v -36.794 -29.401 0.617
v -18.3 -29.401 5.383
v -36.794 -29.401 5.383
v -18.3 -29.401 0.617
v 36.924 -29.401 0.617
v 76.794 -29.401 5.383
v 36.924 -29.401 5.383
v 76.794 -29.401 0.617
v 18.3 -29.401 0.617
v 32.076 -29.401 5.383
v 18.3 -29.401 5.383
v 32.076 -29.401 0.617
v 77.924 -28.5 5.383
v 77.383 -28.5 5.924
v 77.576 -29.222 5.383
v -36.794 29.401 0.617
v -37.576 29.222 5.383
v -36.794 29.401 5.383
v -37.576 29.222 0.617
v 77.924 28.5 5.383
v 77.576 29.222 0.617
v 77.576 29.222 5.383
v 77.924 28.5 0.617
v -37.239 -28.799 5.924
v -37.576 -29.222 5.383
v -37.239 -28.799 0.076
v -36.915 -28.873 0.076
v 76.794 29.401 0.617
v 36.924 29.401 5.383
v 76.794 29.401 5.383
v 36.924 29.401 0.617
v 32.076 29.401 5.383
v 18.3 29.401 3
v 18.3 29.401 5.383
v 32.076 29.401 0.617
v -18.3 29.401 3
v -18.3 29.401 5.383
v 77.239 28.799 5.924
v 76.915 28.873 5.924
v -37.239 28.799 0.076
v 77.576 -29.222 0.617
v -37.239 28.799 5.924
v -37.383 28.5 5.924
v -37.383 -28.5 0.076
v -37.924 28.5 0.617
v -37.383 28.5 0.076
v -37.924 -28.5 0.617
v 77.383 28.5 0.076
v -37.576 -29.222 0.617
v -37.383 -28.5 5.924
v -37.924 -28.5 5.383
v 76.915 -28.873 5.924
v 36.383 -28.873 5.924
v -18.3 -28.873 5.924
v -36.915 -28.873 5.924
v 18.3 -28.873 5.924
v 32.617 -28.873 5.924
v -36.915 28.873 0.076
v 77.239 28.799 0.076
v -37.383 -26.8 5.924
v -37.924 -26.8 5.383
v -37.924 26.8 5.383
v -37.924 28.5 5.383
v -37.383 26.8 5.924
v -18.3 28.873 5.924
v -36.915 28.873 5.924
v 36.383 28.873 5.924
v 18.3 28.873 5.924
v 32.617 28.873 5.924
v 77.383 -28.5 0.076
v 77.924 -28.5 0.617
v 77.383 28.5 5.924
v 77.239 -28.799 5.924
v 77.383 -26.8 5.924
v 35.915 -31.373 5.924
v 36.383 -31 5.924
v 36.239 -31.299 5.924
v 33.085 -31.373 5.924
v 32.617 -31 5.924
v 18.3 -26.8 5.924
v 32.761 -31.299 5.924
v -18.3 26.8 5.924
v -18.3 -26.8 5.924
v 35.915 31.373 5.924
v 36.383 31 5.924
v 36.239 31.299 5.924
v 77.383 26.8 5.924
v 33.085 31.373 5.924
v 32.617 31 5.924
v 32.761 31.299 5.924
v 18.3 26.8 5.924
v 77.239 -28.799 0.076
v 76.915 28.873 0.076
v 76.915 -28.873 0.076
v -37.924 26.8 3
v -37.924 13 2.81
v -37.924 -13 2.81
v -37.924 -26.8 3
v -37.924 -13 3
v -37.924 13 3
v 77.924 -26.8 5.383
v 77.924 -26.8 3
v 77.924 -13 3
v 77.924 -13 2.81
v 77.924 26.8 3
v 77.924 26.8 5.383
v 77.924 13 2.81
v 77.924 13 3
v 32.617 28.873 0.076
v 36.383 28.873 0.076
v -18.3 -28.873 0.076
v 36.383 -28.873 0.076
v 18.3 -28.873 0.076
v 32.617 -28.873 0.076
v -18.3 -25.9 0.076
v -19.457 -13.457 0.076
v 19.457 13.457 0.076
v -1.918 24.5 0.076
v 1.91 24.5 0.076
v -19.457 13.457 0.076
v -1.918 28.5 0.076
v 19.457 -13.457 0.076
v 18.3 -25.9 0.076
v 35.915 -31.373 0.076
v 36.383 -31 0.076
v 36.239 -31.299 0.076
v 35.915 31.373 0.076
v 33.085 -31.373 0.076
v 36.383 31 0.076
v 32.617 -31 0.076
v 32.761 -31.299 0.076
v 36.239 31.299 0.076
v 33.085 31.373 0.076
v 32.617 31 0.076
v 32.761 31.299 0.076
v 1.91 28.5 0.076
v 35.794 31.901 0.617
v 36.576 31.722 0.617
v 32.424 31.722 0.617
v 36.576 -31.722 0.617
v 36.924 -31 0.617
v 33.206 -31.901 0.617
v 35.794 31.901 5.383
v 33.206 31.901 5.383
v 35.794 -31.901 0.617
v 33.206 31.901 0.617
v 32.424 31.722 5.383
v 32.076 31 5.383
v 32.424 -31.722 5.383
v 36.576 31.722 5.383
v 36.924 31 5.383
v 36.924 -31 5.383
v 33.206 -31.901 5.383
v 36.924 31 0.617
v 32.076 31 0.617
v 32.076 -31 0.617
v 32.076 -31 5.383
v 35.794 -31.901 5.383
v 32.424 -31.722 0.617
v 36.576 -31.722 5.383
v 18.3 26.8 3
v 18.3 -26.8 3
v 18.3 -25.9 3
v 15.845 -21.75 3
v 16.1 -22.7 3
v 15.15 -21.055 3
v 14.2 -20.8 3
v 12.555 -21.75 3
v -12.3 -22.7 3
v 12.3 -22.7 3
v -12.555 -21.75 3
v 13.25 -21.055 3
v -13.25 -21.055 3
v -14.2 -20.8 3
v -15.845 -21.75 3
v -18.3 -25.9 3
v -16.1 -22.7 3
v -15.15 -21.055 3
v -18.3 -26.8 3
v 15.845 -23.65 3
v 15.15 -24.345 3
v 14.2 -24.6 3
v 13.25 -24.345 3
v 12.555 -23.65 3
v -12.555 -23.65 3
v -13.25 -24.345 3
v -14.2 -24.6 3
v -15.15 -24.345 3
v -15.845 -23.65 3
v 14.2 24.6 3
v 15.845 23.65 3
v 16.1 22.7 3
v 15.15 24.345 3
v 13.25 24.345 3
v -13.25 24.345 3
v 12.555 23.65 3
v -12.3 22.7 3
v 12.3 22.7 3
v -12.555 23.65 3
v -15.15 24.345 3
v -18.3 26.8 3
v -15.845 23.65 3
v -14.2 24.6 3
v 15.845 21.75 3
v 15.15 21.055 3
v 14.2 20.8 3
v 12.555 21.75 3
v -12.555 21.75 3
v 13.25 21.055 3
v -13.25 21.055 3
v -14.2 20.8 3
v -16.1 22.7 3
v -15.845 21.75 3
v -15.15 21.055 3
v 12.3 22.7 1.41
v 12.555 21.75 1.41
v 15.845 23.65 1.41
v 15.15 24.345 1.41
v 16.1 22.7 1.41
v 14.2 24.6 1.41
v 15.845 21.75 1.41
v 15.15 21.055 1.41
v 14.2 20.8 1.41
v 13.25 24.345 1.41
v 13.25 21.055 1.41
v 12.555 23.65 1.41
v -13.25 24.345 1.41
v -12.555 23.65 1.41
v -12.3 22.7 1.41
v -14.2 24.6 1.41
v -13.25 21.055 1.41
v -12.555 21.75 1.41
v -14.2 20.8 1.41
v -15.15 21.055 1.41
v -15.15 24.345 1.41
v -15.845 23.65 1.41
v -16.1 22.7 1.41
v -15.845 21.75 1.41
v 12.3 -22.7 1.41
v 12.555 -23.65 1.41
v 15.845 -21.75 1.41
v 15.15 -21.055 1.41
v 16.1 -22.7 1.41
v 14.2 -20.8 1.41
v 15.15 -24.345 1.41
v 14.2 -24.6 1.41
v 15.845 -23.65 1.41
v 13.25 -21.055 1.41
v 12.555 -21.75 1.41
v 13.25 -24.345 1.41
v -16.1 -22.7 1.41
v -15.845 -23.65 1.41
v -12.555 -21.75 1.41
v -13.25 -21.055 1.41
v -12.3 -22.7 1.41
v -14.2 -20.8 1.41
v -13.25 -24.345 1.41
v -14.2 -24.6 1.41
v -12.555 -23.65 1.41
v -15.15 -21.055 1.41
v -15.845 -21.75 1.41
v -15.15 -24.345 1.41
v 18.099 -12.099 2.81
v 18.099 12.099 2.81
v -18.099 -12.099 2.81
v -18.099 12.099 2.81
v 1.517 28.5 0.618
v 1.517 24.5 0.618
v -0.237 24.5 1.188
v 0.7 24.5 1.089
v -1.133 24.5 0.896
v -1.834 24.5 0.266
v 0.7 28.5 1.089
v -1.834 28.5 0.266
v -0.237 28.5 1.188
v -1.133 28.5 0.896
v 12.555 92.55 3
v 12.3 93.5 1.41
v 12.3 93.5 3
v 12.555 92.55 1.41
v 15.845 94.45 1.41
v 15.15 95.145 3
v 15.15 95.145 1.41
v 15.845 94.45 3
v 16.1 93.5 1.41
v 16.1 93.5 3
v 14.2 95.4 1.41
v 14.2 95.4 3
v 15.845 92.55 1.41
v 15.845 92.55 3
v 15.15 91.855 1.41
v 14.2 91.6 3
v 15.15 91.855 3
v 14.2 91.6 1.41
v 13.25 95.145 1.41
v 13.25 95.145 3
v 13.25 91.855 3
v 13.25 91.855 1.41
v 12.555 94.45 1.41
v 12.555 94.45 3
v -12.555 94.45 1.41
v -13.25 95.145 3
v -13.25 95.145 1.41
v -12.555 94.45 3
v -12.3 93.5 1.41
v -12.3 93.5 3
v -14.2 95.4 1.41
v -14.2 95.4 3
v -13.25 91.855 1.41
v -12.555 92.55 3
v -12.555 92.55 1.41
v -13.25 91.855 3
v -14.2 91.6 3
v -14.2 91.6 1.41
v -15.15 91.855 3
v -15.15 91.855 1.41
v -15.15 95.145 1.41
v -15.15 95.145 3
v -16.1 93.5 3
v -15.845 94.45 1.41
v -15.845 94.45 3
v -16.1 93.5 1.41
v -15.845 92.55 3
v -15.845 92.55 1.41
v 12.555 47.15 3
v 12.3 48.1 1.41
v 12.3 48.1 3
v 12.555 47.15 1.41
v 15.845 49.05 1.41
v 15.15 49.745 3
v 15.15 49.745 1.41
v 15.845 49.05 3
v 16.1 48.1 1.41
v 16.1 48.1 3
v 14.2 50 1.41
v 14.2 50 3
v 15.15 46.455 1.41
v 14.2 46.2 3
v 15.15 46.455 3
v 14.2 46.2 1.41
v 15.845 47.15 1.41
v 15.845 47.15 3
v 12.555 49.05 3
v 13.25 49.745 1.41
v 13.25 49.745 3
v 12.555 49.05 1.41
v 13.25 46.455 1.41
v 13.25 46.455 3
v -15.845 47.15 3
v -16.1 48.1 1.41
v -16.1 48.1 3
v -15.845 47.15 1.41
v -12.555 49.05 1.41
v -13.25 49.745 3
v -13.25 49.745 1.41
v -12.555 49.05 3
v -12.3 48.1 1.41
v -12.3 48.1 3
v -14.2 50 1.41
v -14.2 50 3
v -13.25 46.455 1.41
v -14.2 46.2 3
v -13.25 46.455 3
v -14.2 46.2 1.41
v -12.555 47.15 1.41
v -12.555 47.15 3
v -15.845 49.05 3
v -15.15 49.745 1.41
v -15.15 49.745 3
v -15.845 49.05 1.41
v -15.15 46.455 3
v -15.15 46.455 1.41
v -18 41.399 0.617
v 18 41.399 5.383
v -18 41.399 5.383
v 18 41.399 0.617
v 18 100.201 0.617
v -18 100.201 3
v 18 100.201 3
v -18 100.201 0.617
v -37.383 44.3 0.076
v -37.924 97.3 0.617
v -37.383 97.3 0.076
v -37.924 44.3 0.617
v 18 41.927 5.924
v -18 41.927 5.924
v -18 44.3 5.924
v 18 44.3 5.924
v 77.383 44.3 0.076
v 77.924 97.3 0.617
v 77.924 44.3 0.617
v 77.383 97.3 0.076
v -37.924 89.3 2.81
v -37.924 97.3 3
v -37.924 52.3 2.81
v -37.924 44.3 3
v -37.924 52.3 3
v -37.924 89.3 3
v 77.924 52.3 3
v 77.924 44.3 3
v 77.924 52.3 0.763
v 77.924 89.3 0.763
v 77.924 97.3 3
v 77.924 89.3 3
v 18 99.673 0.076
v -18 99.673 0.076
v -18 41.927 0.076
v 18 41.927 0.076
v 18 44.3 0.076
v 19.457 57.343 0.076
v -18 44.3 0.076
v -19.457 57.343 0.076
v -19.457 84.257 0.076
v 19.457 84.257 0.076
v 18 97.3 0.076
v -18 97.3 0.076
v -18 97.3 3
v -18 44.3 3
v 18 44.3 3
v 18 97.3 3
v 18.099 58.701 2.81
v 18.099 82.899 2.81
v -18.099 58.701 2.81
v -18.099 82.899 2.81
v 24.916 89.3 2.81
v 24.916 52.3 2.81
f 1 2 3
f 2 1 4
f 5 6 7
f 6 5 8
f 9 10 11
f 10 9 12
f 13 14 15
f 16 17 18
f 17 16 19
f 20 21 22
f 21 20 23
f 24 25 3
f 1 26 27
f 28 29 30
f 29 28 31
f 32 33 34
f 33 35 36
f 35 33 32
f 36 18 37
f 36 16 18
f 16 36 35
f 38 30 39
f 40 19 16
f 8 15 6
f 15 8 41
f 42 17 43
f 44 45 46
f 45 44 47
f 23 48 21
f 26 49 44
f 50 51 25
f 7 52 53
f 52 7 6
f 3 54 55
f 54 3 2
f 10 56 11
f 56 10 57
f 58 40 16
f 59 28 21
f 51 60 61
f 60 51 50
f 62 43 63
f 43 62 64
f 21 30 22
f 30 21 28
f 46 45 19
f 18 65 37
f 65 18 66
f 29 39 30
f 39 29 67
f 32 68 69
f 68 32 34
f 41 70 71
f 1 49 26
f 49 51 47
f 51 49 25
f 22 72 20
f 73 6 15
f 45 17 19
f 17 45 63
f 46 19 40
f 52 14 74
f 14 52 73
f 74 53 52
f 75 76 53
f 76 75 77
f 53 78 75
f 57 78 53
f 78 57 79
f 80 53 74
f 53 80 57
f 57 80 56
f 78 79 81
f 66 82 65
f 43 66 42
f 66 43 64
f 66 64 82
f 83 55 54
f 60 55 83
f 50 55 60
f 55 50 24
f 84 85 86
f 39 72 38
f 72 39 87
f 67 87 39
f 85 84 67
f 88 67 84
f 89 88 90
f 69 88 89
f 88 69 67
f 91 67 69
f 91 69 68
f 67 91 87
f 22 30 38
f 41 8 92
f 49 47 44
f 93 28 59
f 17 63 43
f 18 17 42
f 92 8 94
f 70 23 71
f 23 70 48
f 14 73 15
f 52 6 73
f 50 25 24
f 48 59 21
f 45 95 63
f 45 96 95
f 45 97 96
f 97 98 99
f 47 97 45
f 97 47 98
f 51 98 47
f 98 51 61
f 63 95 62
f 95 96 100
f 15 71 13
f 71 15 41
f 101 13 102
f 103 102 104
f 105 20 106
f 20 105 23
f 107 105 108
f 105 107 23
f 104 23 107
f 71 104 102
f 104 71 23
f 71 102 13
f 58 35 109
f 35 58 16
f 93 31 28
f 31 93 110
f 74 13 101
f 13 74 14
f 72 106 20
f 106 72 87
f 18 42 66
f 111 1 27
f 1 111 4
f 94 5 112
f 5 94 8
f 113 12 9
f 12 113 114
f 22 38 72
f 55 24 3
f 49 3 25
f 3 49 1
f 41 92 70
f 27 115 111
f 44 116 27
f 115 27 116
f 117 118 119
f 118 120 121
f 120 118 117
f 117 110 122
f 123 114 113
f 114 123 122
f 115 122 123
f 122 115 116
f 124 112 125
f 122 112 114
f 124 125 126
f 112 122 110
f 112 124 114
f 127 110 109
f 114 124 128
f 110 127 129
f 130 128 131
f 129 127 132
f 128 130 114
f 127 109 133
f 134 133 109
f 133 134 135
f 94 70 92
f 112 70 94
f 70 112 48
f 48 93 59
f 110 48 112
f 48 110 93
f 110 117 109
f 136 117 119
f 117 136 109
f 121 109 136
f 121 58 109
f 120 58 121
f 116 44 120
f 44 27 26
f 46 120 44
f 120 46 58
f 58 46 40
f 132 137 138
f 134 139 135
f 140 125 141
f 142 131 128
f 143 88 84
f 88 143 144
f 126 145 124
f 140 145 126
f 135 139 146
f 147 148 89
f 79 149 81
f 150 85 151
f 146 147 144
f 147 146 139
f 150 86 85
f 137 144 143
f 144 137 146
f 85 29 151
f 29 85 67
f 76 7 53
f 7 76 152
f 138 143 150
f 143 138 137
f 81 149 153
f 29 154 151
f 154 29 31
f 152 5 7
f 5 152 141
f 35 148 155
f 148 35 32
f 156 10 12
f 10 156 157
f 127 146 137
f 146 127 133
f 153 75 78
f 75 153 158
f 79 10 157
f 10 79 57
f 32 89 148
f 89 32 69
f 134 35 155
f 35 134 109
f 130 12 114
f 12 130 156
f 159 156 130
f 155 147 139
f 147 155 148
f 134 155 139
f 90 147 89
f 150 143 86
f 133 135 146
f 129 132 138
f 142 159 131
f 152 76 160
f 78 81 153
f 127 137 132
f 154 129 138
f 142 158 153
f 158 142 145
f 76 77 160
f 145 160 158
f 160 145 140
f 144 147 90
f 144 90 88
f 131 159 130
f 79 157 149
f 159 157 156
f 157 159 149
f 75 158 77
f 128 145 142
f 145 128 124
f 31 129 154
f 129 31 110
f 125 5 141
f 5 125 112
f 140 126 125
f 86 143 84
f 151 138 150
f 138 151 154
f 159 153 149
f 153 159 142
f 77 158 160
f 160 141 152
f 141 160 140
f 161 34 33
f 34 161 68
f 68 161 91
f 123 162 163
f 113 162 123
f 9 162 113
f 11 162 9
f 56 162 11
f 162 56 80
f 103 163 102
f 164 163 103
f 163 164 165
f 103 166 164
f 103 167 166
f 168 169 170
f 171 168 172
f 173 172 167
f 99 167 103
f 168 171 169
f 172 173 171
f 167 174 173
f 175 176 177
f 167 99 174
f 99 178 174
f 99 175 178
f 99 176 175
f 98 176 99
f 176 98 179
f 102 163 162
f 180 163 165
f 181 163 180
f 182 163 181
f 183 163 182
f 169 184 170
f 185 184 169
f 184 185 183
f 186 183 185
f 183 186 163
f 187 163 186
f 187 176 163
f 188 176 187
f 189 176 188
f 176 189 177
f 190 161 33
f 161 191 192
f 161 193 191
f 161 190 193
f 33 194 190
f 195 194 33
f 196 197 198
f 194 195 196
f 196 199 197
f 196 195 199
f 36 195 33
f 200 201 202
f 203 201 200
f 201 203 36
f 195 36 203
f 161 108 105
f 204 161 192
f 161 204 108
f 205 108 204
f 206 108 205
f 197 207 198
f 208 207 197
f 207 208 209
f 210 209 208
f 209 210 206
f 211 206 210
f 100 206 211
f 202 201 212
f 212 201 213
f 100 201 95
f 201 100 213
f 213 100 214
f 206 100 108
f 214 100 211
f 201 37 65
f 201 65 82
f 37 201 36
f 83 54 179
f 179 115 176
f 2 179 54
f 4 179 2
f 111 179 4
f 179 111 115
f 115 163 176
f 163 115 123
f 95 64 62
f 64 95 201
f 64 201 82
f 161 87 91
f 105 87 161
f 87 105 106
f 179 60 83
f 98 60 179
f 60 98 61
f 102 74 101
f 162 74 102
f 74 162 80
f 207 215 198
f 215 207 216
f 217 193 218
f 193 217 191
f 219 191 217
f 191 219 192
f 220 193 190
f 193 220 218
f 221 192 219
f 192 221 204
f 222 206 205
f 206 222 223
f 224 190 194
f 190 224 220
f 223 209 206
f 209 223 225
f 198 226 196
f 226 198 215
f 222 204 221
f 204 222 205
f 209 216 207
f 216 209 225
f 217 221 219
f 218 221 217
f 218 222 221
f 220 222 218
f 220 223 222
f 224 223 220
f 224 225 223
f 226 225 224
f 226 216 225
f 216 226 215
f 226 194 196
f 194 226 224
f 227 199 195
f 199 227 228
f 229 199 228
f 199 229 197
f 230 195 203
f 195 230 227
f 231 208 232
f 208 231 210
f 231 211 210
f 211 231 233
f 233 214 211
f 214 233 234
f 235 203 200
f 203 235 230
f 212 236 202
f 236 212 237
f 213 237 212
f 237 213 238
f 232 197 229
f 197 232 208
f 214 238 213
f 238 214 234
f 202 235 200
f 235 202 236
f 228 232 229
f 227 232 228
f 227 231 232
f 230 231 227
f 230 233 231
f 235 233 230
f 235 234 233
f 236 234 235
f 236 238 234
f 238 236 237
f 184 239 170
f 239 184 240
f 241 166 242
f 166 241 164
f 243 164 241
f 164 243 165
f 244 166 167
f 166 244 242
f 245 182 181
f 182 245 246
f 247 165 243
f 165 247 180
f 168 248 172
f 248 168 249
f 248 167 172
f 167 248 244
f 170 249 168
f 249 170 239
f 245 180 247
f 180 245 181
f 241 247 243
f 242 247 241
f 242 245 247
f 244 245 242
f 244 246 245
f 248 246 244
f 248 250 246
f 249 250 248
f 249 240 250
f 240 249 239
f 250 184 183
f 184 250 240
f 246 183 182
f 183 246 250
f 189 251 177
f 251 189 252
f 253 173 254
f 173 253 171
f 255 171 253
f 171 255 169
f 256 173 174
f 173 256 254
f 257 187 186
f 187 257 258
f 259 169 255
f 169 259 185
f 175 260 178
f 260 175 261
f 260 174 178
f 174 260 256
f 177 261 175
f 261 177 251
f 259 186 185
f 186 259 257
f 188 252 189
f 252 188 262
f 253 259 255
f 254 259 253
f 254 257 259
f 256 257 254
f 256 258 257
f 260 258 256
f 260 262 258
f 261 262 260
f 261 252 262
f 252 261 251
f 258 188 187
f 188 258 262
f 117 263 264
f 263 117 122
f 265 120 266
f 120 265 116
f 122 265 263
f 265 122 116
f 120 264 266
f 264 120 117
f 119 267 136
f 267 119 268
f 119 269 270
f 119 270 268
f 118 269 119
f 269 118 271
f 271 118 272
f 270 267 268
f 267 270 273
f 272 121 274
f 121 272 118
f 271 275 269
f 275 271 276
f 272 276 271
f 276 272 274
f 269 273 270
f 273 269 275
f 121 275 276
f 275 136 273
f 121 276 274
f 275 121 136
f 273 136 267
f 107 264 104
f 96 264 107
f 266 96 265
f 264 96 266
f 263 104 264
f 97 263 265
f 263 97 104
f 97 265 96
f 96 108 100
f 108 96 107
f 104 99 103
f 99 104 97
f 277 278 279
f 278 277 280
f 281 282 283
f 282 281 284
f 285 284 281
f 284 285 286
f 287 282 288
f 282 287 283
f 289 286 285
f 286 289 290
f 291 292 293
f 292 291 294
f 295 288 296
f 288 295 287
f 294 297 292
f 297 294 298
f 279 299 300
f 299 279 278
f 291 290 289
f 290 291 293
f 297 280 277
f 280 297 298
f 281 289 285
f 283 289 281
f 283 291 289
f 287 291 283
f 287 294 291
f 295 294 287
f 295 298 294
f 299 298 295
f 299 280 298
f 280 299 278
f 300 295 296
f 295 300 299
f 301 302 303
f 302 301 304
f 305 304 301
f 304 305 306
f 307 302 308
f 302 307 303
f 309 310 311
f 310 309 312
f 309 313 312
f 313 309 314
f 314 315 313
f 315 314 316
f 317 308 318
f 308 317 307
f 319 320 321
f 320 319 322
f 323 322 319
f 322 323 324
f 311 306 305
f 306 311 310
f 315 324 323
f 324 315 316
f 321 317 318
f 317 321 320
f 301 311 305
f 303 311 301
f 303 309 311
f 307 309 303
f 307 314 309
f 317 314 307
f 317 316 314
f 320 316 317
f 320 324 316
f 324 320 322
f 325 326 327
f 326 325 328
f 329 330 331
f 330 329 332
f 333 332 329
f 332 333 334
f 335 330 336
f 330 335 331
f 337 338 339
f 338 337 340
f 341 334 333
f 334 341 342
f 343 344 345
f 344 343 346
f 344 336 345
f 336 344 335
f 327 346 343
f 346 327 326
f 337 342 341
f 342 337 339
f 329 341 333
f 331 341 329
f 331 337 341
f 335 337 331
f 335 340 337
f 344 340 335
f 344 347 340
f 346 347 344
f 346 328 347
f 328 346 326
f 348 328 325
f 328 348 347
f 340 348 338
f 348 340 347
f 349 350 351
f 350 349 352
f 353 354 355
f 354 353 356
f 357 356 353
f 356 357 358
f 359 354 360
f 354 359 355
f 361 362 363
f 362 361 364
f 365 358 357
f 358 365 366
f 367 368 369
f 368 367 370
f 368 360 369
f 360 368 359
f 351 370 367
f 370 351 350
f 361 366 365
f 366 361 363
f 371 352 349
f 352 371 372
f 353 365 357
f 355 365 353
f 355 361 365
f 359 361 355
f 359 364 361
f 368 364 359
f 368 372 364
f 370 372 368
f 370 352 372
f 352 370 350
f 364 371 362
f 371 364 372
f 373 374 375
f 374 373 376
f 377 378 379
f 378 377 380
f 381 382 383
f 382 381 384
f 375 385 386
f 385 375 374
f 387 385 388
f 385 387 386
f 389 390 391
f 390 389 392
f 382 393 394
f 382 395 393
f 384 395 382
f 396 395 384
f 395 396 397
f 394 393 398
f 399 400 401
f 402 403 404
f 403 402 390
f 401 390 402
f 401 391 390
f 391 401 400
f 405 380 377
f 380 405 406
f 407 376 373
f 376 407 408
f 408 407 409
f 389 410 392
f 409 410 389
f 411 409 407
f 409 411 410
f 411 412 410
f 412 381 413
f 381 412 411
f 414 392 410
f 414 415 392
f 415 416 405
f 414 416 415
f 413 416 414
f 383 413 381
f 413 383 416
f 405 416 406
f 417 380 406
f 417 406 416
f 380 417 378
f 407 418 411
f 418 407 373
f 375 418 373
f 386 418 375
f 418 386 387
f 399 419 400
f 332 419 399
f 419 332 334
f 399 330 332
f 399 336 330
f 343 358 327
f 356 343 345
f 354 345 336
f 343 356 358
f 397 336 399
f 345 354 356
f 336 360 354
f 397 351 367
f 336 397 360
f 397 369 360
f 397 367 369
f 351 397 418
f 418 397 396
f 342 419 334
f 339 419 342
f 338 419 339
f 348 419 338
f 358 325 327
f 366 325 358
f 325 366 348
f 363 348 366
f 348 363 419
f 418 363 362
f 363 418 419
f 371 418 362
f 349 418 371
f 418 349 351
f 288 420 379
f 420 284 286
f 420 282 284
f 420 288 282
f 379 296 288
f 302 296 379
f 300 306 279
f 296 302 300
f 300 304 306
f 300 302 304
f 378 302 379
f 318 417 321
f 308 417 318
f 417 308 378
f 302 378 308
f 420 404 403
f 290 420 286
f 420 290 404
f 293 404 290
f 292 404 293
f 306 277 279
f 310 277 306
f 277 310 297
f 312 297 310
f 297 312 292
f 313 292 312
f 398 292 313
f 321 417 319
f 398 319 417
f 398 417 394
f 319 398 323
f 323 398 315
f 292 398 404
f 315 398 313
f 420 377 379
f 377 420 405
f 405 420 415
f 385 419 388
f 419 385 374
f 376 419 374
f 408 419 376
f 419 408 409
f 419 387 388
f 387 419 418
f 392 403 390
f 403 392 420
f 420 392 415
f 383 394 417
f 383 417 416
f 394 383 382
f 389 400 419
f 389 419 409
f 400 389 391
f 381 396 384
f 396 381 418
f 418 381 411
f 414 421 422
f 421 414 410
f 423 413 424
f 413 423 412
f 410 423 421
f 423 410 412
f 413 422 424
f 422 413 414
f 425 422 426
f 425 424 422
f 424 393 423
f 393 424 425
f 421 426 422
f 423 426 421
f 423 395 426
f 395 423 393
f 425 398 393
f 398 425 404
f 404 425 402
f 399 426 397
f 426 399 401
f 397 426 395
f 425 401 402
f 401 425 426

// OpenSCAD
// -*- mode: SCAD ; c-file-style: "ellemtel" ; coding: utf-8 -*-
//
// Holder to scan Minox film strips with a Reflecta ProScan 10T
//
// © 2018 Roland Sieker <ospalh@gmail.com>
// Licence: CC-BY-SA 4.0


// Customizer-code rausgenommen. Hier gibt’s nicht viel zu verstellen.

// Teile wieder rein. Das preview, stack, print ist gut.
// … to preview. You will get all parts when you click “Create Thing”.
part = "halter"; // [halter: Filmhalter, einsatz: Klemmeinsatz]


// Auf false schalten, ums STL zu erzeugen
preview = true;


// Ausser vielleicht den Filmstreifengrößen.

// *******************
// These are for Minox
// *******************
// Comment them out for 110
w_streifen = 35;
w_bild = 24;
l_bild = 36;


// // ********************
// // Try this set for 110
// // ********************
// // Uncomment these in for 110
// w_streifen = 16;
// w_bild = 14; // Nominally 13. This should work out
// l_bild = 25.4;
// // Total pitch, picture plus number and hole. Measured. Might be exactly
// // 25.4 mm, as the format was made by Americans.
// bilder_ps = 7;
// // The strips i got were all 5. Otoh, the 135 holder you get with the
// // scanner has 6 holes and the strips i have all have 4. So, +2.

// Größen des Halters.

// Länge == Maß in Richtung des Filmlaus.
// Höhe == Maß normal zum Film
// Breite oder Weite == Maß in Richtung Filmkante zu Filmkante

// Die beiden wichtigen. Wenn diese falsch sind passt’s nicht oder wackelt.
h_ue_a = 6;  // Höhe über alles
w_gesamt = 59;  // Gesamtbreite
r_r = 1;  // Rundungsradius
l_sr = 20;  // Länge scannerrahemen. Abstand Fenster Scannergehäusewand
l_er = 40;


// Auch wichtig:
l_zk = 4;  // Länge Zentrierkerbe
b_zk = 4;  // Breite Zentrierkerbe
h_zk = 1.2;  // Tiefe der Zentrierkerbe
w_zk = 1;  // Wand bzw Abstand der Zentrierkerbe vom Rand

l_griff = l_bild;
w_rand = 3;


w_stop = w_gesamt + 5;  // Breite für Klotz, der Durchschieben den Halters verhindert.
l_stop = 5;  // Länge für diesen Klotz



l_filmsteg = 0.4;
// Steg zwischen zwei Bildern. Ein mal rüber mit der Düse sollte funktionieren.


// Größen der Haltemagnete
d_mag = 3.8; // großes Loch
h_mag = 1;

w_schraeg = 1.5;  // Breite der Abschrägung rund um die Filmfenster




// *******************************************************
// Extra parameters. These can be changed reasonably safely.


w = 1.8;  // Wall width
p = 1.2;  // Bottom, top plate height
c = 0.6;  // Clearance
angle = 60; // Overhangs much below 60° are a problem for me

// *******************************************************
// Some shortcuts. These shouldn’t be changed

tau = 2 * PI;  // π is still wrong. τ = ⌀ ÷ r

xy_factor = 1/tan(angle);
// To get from a height to a horizontal width inclined correctly
z_factor = tan(angle);  // The other way around

some_distance = 1.2 * w_gesamt;
ms = 0.01;  // Muggeseggele.

// fn for differently sized objects and fs, fa; all for preview or rendering.
pna = 40;
pnb = 15;
pa = 5;
ps = 1;
rna = 180;
rnb = 30;
ra = 1;
rs = 0.1;
function na() = (preview) ? pna : rna;
function nb() = (preview) ? pnb : rnb;
$fs = (preview) ? ps : rs;
$fa = (preview) ? pa : ra;


l_ue_a =  l_sr + l_bild + l_sr + l_er;
echo("Länge über alles",l_ue_a);
w_einsatz = w_gesamt - 2 * w_rand;
h_bd = h_ue_a/2;  // Höhe Boden oder Deckel

h_bk = 0.2;  // Höhe Bildkerbe. 0.4 mm (dies × 2) sollte reichen. Für 1. test
w_br = 1;  // Extra Rand für Bildkerbe. (Mit der Perforation haben wir’s.)
l_br = 2;  // Extra Rand für Bildkerbe. (Mit der Perforation haben wir’s.)
h_lkl = 0.75*h_bd;

// *******************************************************
// End setup




// *******************************************************
// Generate the parts


// print_part();
// filmhalter();
// einsatz();
preview_parts();
// stack_parts();




module print_part()
{
   if ("halter" == part)
   {
      filmhalter();
   }
   if ("einsatz" == part)
   {
      einsatz();
   }
}

module preview_parts()
{
   filmhalter();
   translate([0, some_distance, 0])
   {
      einsatz();
   }
}

module stack_parts()
{
   // intersection()
   {
       // color("yellow")
      {
         filmhalter();
      }
      translate([0,0,h_ue_a + ms])
      {
         rotate([180, 0,0])
         {
            // color("red")
            {
               einsatz();
            }
         }
      }
   }
}

// *******************************************************
// Code for the parts themselves


module filmhalter()
{
   difference()
   {
      basis_filmhalter();
      fenster();
      magnetausschnitte(0);
      zentrierkerbe();
      langkerbe(w_bild);
   }
}

module einsatz()
{
   difference()
   {
      basis_einsatz();
      fenster();
      langkerbe(w_streifen);
      magnetausschnitte(0);
      leitkeil();
   }

}


module basis_filmhalter()
{
   translate([0,0,h_bd])
   {
      difference()
      {
         massiver_halter();
         einsatzausschnitt(c);
      }
   }
}


module basis_einsatz()
{
   translate([0,0,h_bd])
   {
      intersection()
      {
         massiver_halter();
         rotate([0,180,0])
         {
            einsatzausschnitt(0);
         }
      }
   }

}

module massiver_halter()
{
   translate([l_er/2, 0, 0])
   {
      rquad(l_ue_a, w_gesamt, h_ue_a);
   }
   translate([w_bild/2+l_sr+l_stop/2, 0, 0])
   {
      rquad(l_stop, w_stop, h_ue_a);
   }
   // todo: Stopper
}

module rquad(xx, yy, zz)
{
   hull()
   {
      vosp();
      mirror([0,0,1])
      {
         vosp();
      }
   }

   module vosp()
   {
      tosp();
      mirror([0,1,0])
      {
         tosp();
      }
   }
   module tosp()
   {
      osp();
      mirror([1,0,0])
      {
         osp();
      }

   }

   module osp()
   {
      translate([xx/2-r_r, yy/2-r_r, zz/2-r_r])
      {
         sphere(r=r_r);
      }
   }
}


module einsatzausschnitt(ec)
{
   translate([0, 0, h_ue_a])
   {
      cube(
         [l_ue_a+2*ms + 2*l_er, w_einsatz + ec, 2*h_ue_a],
         center=true);  // Zu lang. Kein Problem

      grip_cut();
   }
   module grip_cut()
   {
      cube([l_griff + ec, w_gesamt + 2*ms, 2*h_ue_a], center=true);
      translate([0, -w_gesamt/2, 0])
      {
         cube([l_griff + ec, 2*w_rand+2*ec, 4*h_ue_a], center=true);
      }
   }
}

module fenster()
{
   translate([0, 0, h_bd])
   {
      hull()
      {
         translate([0,0,-0.5+ms])
         {
            cube([l_bild, w_bild, 1], center=true);
         }
         translate([0,0,-h_bd-0.5-ms])
         {
            cube(
               [l_bild+2*w_schraeg, w_bild+2*w_schraeg, 1], center=true);
         }
      }

   }
}


module magnetausschnitte(mo)
{
   magnetausschnitt(1, 1, mo);
   magnetausschnitt(-1, 1, mo);
   magnetausschnitt(1, -1, mo);
   magnetausschnitt(-1, -1, mo);
}

module magnetausschnitt(xf, yf, mo)
{
   yo_mag = w_gesamt/2 - w_rand - d_mag;
   // Mittig in den Griffen.
   translate(
      [xf * (l_bild/2-d_mag) , yf * (yo_mag-mo), h_bd - h_mag-c + ms])
   {
      cylinder(d=d_mag, h=h_mag+c);  // N.B. Spiel ist schon im d_mag
      // eingerechnet
   }
}


module zentrierkerbe()
{
   // Den Radius der Zentrierkerbe kann mensch per Pythagoras bestimmen.
   // Hypothenuse = r_zk
   // 1. Kathete = l_zk/2
   // 2. Kathete = r_zk - h_zk
   // h_zk > 0
   // r_zk * r_zk = l_zk * l_zk / 4 + r_zk * r_zk - 2 * r_zk * h_zk + h_zk * h_zk
   // 0 = l_zk * l_zk / 4 - 2 * r_zk * h_zk + h_zk * h_zk
   // 2 * r_zk * h_zk =
   r_zk = (l_zk * l_zk / 4 + h_zk * h_zk) / (2 * h_zk);
   translate([-l_bild/2 + l_bild/2, w_gesamt/2 - w_zk, h_zk-r_zk])
   {
      rotate([90,0,0])
      {
         cylinder(r=r_zk, h=b_zk);
      }
   }
}


module langkerbe(kw)
{
   translate([0, 0, h_bd-h_bk/2+ms])
   {
      cube(
         [l_ue_a+2*ms + 2*l_er, kw + 2*w_br, h_bk],
         center=true);  // Zu lang. Kein Problem
   }

}


module leitkeil()
{
   xo = l_bild/2+l_br;
   llk = l_er+l_sr-l_br;
   translate([xo, 0, h_bd+ms])
   {
      hull()
      {
         translate([0,0,-ms/2])
         {
            cube([ms, w_streifen + 2*w_br, ms], center=true);
         }
         translate([llk+ms,0,-h_lkl/2])
         {
            cube([ms, w_streifen + 2*w_br, h_lkl], center=true);
         }
      }
   }
}
